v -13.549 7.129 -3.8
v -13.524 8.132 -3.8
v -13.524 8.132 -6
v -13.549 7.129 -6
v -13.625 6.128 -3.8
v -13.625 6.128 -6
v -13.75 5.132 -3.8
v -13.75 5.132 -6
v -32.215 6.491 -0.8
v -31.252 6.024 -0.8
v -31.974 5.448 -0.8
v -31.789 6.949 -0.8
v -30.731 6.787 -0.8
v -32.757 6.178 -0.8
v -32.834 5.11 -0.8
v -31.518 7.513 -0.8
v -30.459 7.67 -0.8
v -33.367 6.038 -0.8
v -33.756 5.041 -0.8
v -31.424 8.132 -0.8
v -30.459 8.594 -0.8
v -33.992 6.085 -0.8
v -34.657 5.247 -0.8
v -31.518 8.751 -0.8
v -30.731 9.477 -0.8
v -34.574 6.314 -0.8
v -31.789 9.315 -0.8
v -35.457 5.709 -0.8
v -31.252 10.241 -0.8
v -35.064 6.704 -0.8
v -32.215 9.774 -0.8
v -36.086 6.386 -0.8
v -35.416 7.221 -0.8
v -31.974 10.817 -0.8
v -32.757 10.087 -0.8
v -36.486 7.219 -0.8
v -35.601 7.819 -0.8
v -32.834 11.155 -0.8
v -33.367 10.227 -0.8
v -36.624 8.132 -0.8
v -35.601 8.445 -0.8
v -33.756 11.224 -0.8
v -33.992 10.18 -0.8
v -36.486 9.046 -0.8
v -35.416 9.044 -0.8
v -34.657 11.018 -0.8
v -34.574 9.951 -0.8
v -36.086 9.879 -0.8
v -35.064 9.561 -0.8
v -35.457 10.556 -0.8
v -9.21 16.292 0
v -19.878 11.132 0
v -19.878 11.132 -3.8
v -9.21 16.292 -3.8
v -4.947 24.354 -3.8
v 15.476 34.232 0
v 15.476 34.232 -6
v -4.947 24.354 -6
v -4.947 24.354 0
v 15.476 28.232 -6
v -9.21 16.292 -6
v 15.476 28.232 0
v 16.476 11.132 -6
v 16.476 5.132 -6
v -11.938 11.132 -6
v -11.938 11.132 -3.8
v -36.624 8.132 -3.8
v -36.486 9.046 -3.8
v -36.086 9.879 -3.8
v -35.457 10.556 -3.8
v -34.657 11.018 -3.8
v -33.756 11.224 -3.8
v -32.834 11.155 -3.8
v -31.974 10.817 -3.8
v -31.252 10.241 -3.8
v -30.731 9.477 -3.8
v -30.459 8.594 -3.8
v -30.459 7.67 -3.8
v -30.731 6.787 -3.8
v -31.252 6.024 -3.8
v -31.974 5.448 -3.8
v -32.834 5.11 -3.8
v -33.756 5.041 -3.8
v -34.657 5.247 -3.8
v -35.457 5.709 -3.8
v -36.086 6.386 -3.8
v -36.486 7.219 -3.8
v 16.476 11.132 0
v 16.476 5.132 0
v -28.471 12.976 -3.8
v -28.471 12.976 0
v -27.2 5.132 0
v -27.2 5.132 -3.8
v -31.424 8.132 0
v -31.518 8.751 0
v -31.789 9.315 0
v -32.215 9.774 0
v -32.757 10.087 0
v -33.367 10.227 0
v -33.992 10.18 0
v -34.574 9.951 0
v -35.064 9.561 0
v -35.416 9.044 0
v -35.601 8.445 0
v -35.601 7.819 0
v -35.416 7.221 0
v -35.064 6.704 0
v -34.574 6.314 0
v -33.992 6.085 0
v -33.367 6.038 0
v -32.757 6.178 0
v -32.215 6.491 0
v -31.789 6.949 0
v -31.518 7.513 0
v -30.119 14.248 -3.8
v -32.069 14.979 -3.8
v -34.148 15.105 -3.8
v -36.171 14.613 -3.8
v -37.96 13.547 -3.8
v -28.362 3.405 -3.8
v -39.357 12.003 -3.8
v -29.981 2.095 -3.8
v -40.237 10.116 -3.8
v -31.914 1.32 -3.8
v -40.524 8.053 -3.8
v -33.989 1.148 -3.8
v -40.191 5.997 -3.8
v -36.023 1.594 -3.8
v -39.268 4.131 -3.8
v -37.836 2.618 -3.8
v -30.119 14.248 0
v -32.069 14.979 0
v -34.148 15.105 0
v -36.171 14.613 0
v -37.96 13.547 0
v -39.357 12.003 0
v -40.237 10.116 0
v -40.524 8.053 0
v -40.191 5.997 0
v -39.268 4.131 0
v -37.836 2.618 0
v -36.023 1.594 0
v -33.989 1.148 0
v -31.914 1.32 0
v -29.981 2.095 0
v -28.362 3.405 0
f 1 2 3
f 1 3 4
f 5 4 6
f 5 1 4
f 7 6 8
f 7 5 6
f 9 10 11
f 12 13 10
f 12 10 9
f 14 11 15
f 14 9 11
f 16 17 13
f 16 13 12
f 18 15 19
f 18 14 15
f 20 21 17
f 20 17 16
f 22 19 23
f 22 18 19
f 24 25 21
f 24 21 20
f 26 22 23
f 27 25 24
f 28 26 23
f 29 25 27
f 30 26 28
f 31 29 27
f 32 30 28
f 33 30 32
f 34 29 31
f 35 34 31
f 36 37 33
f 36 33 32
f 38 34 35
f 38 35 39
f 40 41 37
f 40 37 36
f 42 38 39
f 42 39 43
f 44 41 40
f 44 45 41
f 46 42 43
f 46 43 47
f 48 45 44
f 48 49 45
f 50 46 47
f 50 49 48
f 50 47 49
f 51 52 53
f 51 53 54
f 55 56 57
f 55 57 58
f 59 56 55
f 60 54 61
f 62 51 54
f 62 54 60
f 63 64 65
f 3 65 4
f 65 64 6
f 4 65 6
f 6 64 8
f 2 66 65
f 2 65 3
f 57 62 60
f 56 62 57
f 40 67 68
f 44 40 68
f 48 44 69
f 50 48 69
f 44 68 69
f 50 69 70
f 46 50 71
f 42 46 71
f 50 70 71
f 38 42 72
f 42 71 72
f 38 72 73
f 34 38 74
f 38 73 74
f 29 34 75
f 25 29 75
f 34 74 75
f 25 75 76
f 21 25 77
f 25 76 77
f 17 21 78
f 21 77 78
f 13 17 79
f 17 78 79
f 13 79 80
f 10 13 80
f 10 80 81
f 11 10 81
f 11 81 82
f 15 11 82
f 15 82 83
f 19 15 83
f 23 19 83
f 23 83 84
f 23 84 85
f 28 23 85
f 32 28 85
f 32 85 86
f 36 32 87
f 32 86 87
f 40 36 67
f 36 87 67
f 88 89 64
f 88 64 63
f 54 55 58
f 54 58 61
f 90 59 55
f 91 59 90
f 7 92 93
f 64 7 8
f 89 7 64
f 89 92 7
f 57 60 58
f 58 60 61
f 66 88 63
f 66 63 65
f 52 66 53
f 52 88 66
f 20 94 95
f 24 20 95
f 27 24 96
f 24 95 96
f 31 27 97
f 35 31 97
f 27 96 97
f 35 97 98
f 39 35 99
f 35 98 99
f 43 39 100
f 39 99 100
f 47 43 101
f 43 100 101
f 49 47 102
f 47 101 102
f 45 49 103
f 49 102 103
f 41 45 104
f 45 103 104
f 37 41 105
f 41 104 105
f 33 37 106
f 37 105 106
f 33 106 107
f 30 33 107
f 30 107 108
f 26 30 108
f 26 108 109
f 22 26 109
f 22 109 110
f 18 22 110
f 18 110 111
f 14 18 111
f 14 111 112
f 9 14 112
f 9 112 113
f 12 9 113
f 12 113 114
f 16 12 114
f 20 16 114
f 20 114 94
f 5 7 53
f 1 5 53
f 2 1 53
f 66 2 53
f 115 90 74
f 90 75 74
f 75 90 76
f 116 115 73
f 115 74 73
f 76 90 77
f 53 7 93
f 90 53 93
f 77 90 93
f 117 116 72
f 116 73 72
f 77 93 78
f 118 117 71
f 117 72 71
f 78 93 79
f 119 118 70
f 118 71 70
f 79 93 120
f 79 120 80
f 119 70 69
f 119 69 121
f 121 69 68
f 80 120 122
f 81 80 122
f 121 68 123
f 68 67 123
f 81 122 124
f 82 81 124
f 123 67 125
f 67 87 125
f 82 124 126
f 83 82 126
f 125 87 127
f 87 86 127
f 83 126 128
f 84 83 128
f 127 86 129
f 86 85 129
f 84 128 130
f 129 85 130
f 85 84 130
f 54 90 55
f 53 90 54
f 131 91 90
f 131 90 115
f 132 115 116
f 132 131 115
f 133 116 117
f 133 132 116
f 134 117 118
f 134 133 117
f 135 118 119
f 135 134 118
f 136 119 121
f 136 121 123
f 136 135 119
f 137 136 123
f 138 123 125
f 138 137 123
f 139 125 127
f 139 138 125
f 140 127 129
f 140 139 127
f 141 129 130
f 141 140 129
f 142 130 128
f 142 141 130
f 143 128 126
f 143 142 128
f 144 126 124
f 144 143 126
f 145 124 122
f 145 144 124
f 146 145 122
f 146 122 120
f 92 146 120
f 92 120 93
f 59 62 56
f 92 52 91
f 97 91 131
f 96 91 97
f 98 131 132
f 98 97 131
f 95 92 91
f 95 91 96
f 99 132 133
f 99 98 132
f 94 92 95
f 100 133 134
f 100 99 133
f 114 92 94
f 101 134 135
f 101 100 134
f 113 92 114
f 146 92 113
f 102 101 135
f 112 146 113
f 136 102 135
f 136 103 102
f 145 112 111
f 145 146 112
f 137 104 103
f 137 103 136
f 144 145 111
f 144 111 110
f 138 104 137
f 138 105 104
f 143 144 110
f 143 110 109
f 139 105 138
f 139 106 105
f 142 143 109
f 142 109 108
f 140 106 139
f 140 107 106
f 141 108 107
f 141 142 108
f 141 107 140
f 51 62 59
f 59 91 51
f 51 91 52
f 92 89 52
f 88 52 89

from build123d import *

# Parameters (mm, degrees)
BOSS_EXTRUDE2_DEPTH   = 6
BOSS_EXTRUDE2_2_DEPTH = 6
SKETCH1_3_R           = 2.1
BOSS_EXTRUDE3_DEPTH   = 3.8
SKETCH3_R             = 3.1
CUT_EXTRUDE2_DEPTH    = 3


with BuildPart() as part:
    # Sketch1 → Boss-Extrude2 (new body)
    with BuildSketch(Plane(origin=(0, 0, 0), x_dir=(-1, 0, 0), z_dir=(0, 0, 1))):
        Polygon((9.209773359, -16.292309171), (-15.475780333, -28.232378111), (-15.475780333, -34.232378111), (4.947252827, -24.354032787), align=None)
    extrude(amount=-BOSS_EXTRUDE2_DEPTH)



with BuildPart() as body_2:
    # Sketch1 → Boss-Extrude2 2 (new body)
    with BuildSketch(Plane(origin=(0, 0, 0), x_dir=(-1, 0, 0), z_dir=(0, 0, 1))):
        with BuildLine():
            Line((-16.475780333, -11.132378111), (11.93801277, -11.132378111))
            Line((11.93801277, -11.132378111), (13.524219667, -8.132378111))
            ThreePointArc((13.524219667, -8.132378111), (13.580869915, -6.628117273), (13.750499733, -5.132378111))
            Line((13.750499733, -5.132378111), (-16.475780333, -5.132378111))
            Line((-16.475780333, -5.132378111), (-16.475780333, -11.132378111))
        make_face()
    extrude(amount=-BOSS_EXTRUDE2_2_DEPTH)


with BuildPart() as part_1:
    add(part.part)

    add(body_2.part)  # Boss-Extrude3 merges body 2
    # Sketch1<3> → Boss-Extrude3 (add)
    with BuildSketch(Plane(origin=(0, 0, 0), x_dir=(-1, 0, 0), z_dir=(0, 0, 1))):
        with BuildLine():
            Line((19.877697964, -11.132378111), (9.209773359, -16.292309171))
            Line((9.209773359, -16.292309171), (4.947252827, -24.354032787))
            Line((4.947252827, -24.354032787), (28.470653106, -12.976081758))
            ThreePointArc((28.470653106, -12.976081758), (40.434092032, -7.012706779), (27.199664346, -5.132378111))
            Line((27.199664346, -5.132378111), (13.750499733, -5.132378111))
            ThreePointArc((13.750499733, -5.132378111), (13.580869915, -6.628117273), (13.524219667, -8.132378111))
            Line((13.524219667, -8.132378111), (11.93801277, -11.132378111))
            Line((11.93801277, -11.132378111), (19.877697964, -11.132378111))
        make_face()
        with Locations((33.524219667, -8.132378111)):
            Circle(SKETCH1_3_R, mode=Mode.SUBTRACT)
    extrude(amount=-BOSS_EXTRUDE3_DEPTH)

    # Sketch3 → Cut-Extrude2 (cut)
    with BuildSketch(Plane(origin=(0, 0, -3.8), x_dir=(-1, 0, 0), z_dir=(0, 0, -1))):
        with Locations((33.524219667, 8.132378111)):
            Circle(SKETCH3_R)
    extrude(amount=-CUT_EXTRUDE2_DEPTH, mode=Mode.SUBTRACT)


solid = part_1.part
